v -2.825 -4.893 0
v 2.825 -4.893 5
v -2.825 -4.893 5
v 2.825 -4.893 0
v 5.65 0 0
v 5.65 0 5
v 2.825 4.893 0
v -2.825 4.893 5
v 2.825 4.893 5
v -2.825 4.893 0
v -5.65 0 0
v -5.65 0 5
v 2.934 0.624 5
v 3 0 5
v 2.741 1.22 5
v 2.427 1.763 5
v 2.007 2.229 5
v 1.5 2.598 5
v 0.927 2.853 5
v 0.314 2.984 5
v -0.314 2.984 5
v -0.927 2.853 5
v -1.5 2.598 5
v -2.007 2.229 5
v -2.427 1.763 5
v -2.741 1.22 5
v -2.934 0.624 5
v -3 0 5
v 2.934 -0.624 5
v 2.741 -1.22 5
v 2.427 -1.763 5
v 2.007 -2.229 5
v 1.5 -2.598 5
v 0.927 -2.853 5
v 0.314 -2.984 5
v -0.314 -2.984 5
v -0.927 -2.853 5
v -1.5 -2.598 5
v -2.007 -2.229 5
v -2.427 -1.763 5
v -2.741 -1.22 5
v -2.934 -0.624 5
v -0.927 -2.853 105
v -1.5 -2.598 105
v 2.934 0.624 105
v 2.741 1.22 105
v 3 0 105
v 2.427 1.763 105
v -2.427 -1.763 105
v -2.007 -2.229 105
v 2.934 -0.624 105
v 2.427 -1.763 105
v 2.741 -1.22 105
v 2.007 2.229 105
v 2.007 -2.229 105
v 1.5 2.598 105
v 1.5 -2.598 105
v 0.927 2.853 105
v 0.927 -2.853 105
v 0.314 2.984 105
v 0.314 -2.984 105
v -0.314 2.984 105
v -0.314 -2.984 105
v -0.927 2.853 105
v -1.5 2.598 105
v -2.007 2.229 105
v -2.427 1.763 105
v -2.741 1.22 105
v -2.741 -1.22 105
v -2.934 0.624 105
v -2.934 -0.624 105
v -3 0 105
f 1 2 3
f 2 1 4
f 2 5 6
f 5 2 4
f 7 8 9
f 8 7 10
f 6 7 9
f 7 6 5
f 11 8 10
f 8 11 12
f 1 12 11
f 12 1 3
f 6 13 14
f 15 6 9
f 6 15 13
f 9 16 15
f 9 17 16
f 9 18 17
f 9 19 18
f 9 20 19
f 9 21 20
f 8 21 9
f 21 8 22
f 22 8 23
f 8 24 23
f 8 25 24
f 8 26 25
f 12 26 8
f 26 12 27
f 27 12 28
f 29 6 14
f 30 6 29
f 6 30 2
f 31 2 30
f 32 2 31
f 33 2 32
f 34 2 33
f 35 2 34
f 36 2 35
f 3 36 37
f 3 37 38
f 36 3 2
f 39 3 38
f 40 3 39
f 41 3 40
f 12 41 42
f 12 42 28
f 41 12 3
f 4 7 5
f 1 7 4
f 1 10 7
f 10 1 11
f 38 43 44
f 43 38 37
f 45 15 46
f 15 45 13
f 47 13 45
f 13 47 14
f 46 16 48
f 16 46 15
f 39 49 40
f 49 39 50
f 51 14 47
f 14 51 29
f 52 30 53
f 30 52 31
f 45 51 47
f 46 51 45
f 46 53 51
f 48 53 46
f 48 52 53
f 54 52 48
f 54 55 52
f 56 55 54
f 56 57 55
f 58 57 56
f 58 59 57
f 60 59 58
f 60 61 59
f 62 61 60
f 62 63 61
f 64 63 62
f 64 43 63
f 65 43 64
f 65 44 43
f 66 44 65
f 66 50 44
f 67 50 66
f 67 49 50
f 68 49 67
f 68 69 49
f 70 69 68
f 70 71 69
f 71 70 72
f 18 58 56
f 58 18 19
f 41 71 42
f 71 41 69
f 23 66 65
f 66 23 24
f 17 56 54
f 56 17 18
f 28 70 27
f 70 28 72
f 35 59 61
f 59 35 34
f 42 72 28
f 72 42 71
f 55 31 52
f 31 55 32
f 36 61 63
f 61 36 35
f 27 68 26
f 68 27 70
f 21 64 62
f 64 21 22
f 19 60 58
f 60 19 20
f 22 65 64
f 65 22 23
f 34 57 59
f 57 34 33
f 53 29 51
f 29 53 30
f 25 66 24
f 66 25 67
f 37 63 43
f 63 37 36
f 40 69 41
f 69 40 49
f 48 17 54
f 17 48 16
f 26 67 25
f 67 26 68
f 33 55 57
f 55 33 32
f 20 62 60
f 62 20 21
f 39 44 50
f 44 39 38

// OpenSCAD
// file: tolerances.scad
// F-Roof: A multi-function single-layer roof
// https://github.com/f-roof
// Author: Mihai Oltean; https://tcreate.org
//---------------------------------------------------------------------------------------
tolerance = 0.1;
display_tolerance = 1;

tolerance_z = [0, 0, tolerance];
tolerance_x = [tolerance, 0, 0];
tolerance_y = [0, tolerance, 0];

display_tolerance_z = [0, 0, display_tolerance];
display_tolerance_x = [display_tolerance, 0, 0];
display_tolerance_y = [0, display_tolerance, 0];
//---------------------------------------------------------------------------------------
// file: screws_nuts_washers_params.scad
// Solar-Bear
// A solar-hybrid trike
// https://github.com/solar-b

// Maker: Mihai Oltean
// https://mihaioltean.github.io
// License: MIT
// -----------------------------------------------------------------------------------
M8_screw_head_height = 5.7;
M8_screw_radius = 3.9;
M8_nut_radius = 7.5;
M8_nut_thick = 6.5;
M8_nut_height = M8_nut_thick;
M8_nut_key_size = 13;

M6_screw_radius = 3;
M6_nut_radius = 5.65;
M6_nut_thick = 5;
M6_nut_slim_thick = 3;
M6_autolock_nut_thick = 6;
M6_long_nut_thick = 9;

M14_screw_radius = 7;
M14_nut_radius = 12.75;
M14_nut_key_size = 22;
M14_nut_thick = 11;
M14_autolock_nut_thick = 14;

M16_screw_radius = 8;
M16_nut_radius = 13.5;
M16_nut_key_size = 24;
M16_nut_thick = 13;
M16_autolock_nut_thick = 16;
// -----------------------------------------------------------------------------------
// main file
// Solar-Bear
// A solar-hybrid trike
// https://github.com/solar-b

// Maker: Mihai Oltean
// https://mihaioltean.github.io
// License: MIT
// -----------------------------------------------------------------------------------
include <screws_nuts_washers_params.scad>
include <tolerances.scad>
//------------------------------------------------------------------------------------
module screw_sunken(screw_radius, screw_length, head_radius, head_thick)
{
	color ("grey")
	difference(){
		union(){
			cylinder (h = head_thick, r1 = head_radius, r2 = screw_radius, $fn = 30);
			cylinder (h = screw_length, r = screw_radius, $fn = 30);
		}
		translate ([-head_radius, -0.75, 0] - display_tolerance_z) cube([2 * head_radius, 1.5, head_thick - 0.5 + display_tolerance]);
	}
}
//------------------------------------------------------------------------------------
module nut (internal_radius, external_radius, height)
{
	color ("grey")
	difference() {
		cylinder ( h = height, r = external_radius, $fn = 6);
		translate ([0, 0, -tolerance]) cylinder ( h = height + 2 * tolerance, r = internal_radius, $fn = 30);
	}
}
//--------------------------------------------------------------
module autolock_nut (internal_radius, external_radius, height)
{
	color ("grey")
	difference() {
		union(){
			cylinder ( h = height - 1, r = external_radius, $fn = 6);
			translate ([0, 0, height - 1]) cylinder ( h = 1, r = internal_radius + 1, $fn = 30);
		}
		translate ([0, 0, -tolerance]) cylinder ( h = height + 2 * tolerance, r = internal_radius, $fn = 30);
	}
}
//--------------------------------------------------------------
module screw_hexa(screw_radius, screw_length, head_radius, head_thick)
{
	color ("grey")
	union(){
		cylinder (h = head_thick, r = head_radius, $fn = 6);
		translate ([0, 0, head_thick]) cylinder (h = screw_length, r = screw_radius, $fn = 30);
	}
}
//--------------------------------------------------------------
module screw_M8_sunken(length)
{
	screw_sunken(M8_screw_radius, length, M8_nut_radius, M8_nut_thick);
}
//------------------------------------------------------------------------------------
module screw_M6_hexa(length)
{
	screw_hexa(M6_screw_radius, length, M6_nut_radius, M6_nut_thick);
}
//------------------------------------------------------------------------------------
module screw_M8_hexa(length)
{
	screw_hexa(M8_screw_radius, length, M8_nut_radius, M8_nut_thick);
}
//------------------------------------------------------------------------------------
module screw_M16_hexa(length)
{
	screw_hexa(M16_screw_radius, length, M16_nut_radius, M16_nut_thick);
}
//------------------------------------------------------------------------------------
module screw_M14_hexa(length)
{
	screw_hexa(M14_screw_radius, length, M14_nut_radius, M14_nut_thick);
}
//------------------------------------------------------------------------------------

screw_M6_hexa(100);
